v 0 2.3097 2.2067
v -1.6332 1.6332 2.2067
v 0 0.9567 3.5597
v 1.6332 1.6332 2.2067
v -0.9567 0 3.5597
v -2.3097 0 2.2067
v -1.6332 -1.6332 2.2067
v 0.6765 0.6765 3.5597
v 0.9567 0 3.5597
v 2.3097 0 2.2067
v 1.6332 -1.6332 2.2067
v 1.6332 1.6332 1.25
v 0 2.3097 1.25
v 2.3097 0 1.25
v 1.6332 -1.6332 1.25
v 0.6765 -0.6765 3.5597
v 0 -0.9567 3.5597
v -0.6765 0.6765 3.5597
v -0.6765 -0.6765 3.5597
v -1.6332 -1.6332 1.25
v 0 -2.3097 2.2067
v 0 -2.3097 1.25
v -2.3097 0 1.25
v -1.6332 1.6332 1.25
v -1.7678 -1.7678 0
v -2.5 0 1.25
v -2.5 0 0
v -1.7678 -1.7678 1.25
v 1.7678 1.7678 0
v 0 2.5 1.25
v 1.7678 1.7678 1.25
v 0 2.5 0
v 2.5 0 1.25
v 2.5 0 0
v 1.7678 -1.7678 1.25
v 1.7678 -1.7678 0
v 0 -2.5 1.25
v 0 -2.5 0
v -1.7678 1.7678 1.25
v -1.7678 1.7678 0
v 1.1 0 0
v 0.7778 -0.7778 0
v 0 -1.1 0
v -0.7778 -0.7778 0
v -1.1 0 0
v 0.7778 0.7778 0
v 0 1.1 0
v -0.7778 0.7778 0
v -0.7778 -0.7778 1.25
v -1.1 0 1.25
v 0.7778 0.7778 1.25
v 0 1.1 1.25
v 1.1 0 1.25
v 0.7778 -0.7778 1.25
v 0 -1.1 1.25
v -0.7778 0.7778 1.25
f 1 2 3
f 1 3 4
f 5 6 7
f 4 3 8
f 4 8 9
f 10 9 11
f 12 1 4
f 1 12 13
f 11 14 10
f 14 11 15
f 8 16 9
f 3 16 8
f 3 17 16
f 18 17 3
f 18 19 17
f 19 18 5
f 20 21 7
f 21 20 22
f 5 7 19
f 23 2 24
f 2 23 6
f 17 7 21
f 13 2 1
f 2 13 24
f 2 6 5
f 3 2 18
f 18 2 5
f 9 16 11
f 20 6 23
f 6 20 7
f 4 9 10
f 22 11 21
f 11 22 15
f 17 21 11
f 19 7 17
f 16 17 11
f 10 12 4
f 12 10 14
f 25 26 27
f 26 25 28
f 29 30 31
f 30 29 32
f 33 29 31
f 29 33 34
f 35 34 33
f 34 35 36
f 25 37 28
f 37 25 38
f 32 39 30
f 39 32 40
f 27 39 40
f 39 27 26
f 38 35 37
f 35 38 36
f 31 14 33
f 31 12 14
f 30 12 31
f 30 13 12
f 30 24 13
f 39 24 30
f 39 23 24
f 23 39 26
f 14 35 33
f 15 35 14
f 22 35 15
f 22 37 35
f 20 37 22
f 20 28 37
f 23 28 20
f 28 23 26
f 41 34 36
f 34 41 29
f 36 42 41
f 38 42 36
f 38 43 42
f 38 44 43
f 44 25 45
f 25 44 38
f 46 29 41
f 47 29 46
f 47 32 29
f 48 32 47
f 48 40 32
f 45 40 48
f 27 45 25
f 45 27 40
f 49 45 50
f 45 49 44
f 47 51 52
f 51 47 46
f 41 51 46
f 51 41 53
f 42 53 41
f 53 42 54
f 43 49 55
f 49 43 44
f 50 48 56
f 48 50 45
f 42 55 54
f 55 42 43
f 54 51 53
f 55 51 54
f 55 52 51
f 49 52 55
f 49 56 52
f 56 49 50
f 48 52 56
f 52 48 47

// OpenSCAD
// file: axle.scad
include <config.scad>;

arm_height = 2 * AXLE_RADIUS;
axle_height = ROOF_HEIGHT + BASE_TOTAL_HEIGHT - EASE;

module carousel_axle_arms() {
    arm_length = 8 * AXLE_RADIUS;
    arm_width = AXLE_RADIUS;

    color(COLOR_AXLE) {
        difference() {
            union() {
                cylinder(h = arm_height, r = 2 * AXLE_RADIUS);
                for (i = [0 : CAROUSEL_FACE_COUNT/2]){
                    rotate(2 * i * 360/CAROUSEL_FACE_COUNT, [0, 0, 1])
                    translate([0, -arm_width/2, 0])
                    cube([arm_length, arm_width, arm_height]);
                }
            }
            translate([0, 0, -BLEED/2])
                cylinder(h = arm_height + BLEED, r = AXLE_RADIUS + EASE);
        }
    }
}

module carousel_axle() {
    color(COLOR_AXLE) {
        cylinder(h = axle_height, r = AXLE_RADIUS);
        translate([0, 0, axle_height - 3 * arm_height])
            cylinder(h = 2 * AXLE_RADIUS, r1 = AXLE_RADIUS, r2 = 2 * AXLE_RADIUS);
    }
}

// just for presentation, for 3D print the separate parts are better...
module carousel_axle_all_in_one() {
    carousel_axle();
    translate([0, 0, axle_height - 2 * arm_height])
    carousel_axle_arms();
}

PEG_SIZE = [0.5 * AXLE_RADIUS, 0.5 * AXLE_RADIUS, 1.5 * AXLE_RADIUS];

module carousel_axle_half() {
    peg_heights = [0.05, 0.35, 0.65, 0.95];

    translate([-axle_height/2, 0, 0])
    rotate([0, 90, 0])
    difference() {
        carousel_axle();
        translate([0, -5 * AXLE_RADIUS, -BLEED/2])
            cube([10 * AXLE_RADIUS, 10 * AXLE_RADIUS, axle_height + BLEED]);
        for (fz = peg_heights) {
            translate([-PEG_SIZE.x, -PEG_SIZE.y/2, fz * axle_height])
                cube([PEG_SIZE.x + EASE, PEG_SIZE.y + EASE, PEG_SIZE.z + EASE]);
        }
    }
}

module carousel_axle_peg() {
    //translate([0, 0, PEG_SIZE.x/2])
    x = PEG_SIZE.z;
    y = PEG_SIZE.y * 2;
    z = PEG_SIZE.x;

    color(COLOR_AXLE)
    cube([x, y, z], center = true);
}

module carousel_axle_bom() {
    dy = 3 * AXLE_RADIUS;

    translate([0, dy, 0])
    carousel_axle_half();

    translate([0, -dy, 0])
    rotate([0, 0, 180])
        carousel_axle_half();

    for (i = [0:3]) {
        translate([2 * i * PEG_SIZE.z, 0, PEG_SIZE.x/2])
        carousel_axle_peg();
    }
}

carousel_axle_bom();
// file: nut.scad
include <config.scad>;

function diam_to_flats(d) = (0.5 * d * sqrt(3));
function flats_to_diam(s) = (2 * s / sqrt(3));

module nut(diam, m, center = false) {
    translate([0, 0, center ? -m/2 : 0])
    rotate(30)
    cylinder(d = diam, h = m, $fn = 6);
}

module nut_ring(diam_outer, diam_inner, m, center = false) {
    translate([0, 0, center ? -m/2 : 0])
    difference() {
        nut(diam_outer, m, center = false);
        translate([0, 0, -BLEED/2])
        nut(diam_inner, m + BLEED, center = false);
    }
}
// file: bearing.scad
include <config.scad>;
use <commons.scad>;

module _bearing_socket(bearing_height, shell_height) {
    difference() {
        // socket body
        cylinder(h = shell_height + bearing_height, d = BEARING_DIAM_OUTER + EASE + 2 * BEARING_SHELL_THICKNESS);
        // bearing slot
        translate([0, 0, shell_height - BLEED])
        cylinder(h = bearing_height + shell_height + EASE, d = BEARING_DIAM_OUTER + EASE);
    }
}

module bearing_top_hole() {
    cylinder(h = BEARING_HEIGHT_TOP + EASE, d = BEARING_DIAM_OUTER + EASE);
    translate([0, 0, BEARING_HEIGHT_TOP - BLEED])
    cylinder(h = BEARING_PEG_OVERRUN + BLEED + 2 * EASE, d = BEARING_DIAM_INNER + 2 * EASE);
}

module bearing_bottom() {
    _bearing_socket(BEARING_HEIGHT_BOTTOM, BEARING_SHELL_BOTTOM);
    translate([0, 0, BEARING_SHELL_BOTTOM - BLEED])
    cylinder(h = BEARING_HEIGHT_BOTTOM + BEARING_HEIGHT_TOP + BEARING_PEG_OVERRUN + BLEED, d = BEARING_DIAM_INNER - EASE);
}

module bearing_top() {
    total_height = BEARING_HEIGHT_TOP + BEARING_SHELL_TOP;
    translate([0, 0, total_height])
    rotate([180, 0, 0])
    difference() {
        cylinder(h = total_height, d = BEARING_DIAM_OUTER + 2 * BEARING_SHELL_THICKNESS + EASE);
        translate([0, 0, -BLEED])
        bearing_top_hole();
    }
}

function mounted_bearing_height() = BEARING_HEIGHT_BOTTOM + BEARING_HEIGHT_TOP + BEARING_SHELL_THICKNESS + BEARING_SHELL_BOTTOM;

// module printable_bearing_bom() {
//     color(COLOR_AXLE) {
//         dx = BEARING_DIAM_OUTER/2 + BEARING_SHELL_THICKNESS + 10*EASE;
//         translate([-dx, 0, 0]) bearing_bottom();
//         translate([+dx, 0, 0]) bearing_top();
//     }
// }

// printable_bearing_bom();
// file: commons.scad
module rect_prism(width, height, p0, p1) {
    dir = p1 - p0;
    h = norm(dir);
    if (dir[0] == 0 && dir[1] == 0) {
        // no transformation necessary
        translate(p0)
        translate([0, 0, h/2])
        cube([size, size, h], center = true);
    }
    else {
        w  = dir / h;
        u0 = cross(w, [0,0,1]);
        u  = u0 / norm(u0);
        v0 = cross(w, u);
        v  = v0 / norm(v0);
        multmatrix(m=[[u[0], v[0], w[0], p0.x],
                      [u[1], v[1], w[1], p0.y],
                      [u[2], v[2], w[2], p0.z],
                      [0,    0,    0,    1]])
        translate([0, 0, h/2])
        cube([width, height, h], center = true);
    }
}

module square_prism(size, p0, p1) {
    rect_prism(size, size, p0, p1);
}

module point_plate(thickness, point_array, indices, fn = 8) {
    hull() {
        for (i = indices) {
            translate(point_array[i])
            sphere(d = thickness, $fn = fn);
        }
    }
}
// file: rig.scad
include <config.scad>;
use <commons.scad>;

use <bearing.scad>;
use <nut.scad>;
use <axle.scad>;
use <lance.scad>;

RIG_CAP_BLEED_HEIGHT = 2;
RIG_CAP_BLEED_DIAM = BEARING_DIAM_INNER;

ROTATOR_FN = 6;

module rig_ribs() {
    inner_sin = sin(360/CAROUSEL_FACE_COUNT/2);
    // iterate each face/wall spot
    dz = 0.5 * RIG_STR;
    for (i = [0 : CAROUSEL_FACE_COUNT]) {
        rotate(i * 360/CAROUSEL_FACE_COUNT, [0, 0, 1]) {
            // star-beam
            square_prism(RIG_STR, [BEARING_DIAM_OUTER/2, 0, dz], [RIG_MAX_R, 0, dz]);
            // cross-beams
            for (frac = RIG_RING_POSITIONS) {
                ring_r = frac * RIG_MAX_R;
                translate([ring_r, 0, 0])
                rotate([0, 0, 180 - FACE_ANGLE/2])
                difference() {
                    dx = 2 * ring_r * inner_sin;
                    square_prism(RIG_STR, [0, 0, dz], [dx, 0, dz]);
                    translate([dx/2, 0, -BLEED])
                    mounted_lance(with_ease = true);
                }
            }
        }
    }
}

function lance_dx_offset(frac) = frac * RIG_MAX_R - BEAM_SIZE/4;

module rig_shape() {
    color(COLOR_AXLE) {
        // cut out nest for top arm rotator
        difference() {
            bearing_top();
            translate([0, 0, -BLEED])
            cylinder(h = RIG_CAP_BLEED_HEIGHT + BLEED, d = RIG_CAP_BLEED_DIAM + EASE, $fn = ROTATOR_FN);
        }
        // outer ring
        difference() {
            cylinder(h = RIG_HEIGHT, r = RIG_MAX_R);
            translate([0, 0, -0.5 * BLEED])
            cylinder(h = RIG_HEIGHT + BLEED, r = RIG_MAX_R - RIG_STR);
        }
        // ribs with lance holes
        difference() {
            rig_ribs();
            for (i = [0 : CAROUSEL_FACE_COUNT]) {
                rotate(i * 360/CAROUSEL_FACE_COUNT, [0, 0, 1]) {
                    // #square_prism(RIG_STR, [BEARING_DIAM_OUTER/2, 0, dz], [RIG_MAX_R, 0, dz]);
                    for (frac = RIG_RING_POSITIONS) {
                        ring_r = lance_dx_offset(frac);
                        translate([ring_r, 0, -BLEED])
                        mounted_lance(with_ease = true);
                    }
                }
            }
        }
    }
}

// Top rotating part used to attach the carousel seats.
module printable_rig() {
    nut_floor = 1;
    dx = RIG_MAX_R - RIG_STR/2;
    color(COLOR_AXLE) {
        difference() {
            // core round shape
            rig_shape();
            // cut off space for nut holders
            for (i = [0 : CAROUSEL_FACE_COUNT]) {
                rotate(i * 360/CAROUSEL_FACE_COUNT, [0, 0, 1])
                translate([dx, 0, -BLEED/2])
                nut(RIG_NUT_SIZE + RIG_NUT_WALL, RIG_HEIGHT + BLEED);
            }
        }
        // add nut holders
        for (i = [0 : CAROUSEL_FACE_COUNT]) {
            rotate(i * 360/CAROUSEL_FACE_COUNT, [0, 0, 1]) {
                translate([dx, 0, 0])
                nut_ring(RIG_NUT_SIZE + RIG_NUT_WALL + BLEED, RIG_NUT_SIZE - EASE, RIG_STR);

                translate([dx, 0, RIG_STR - nut_floor])
                nut(RIG_NUT_SIZE + RIG_NUT_WALL/2, nut_floor);
            }
        }
    }
}

function mounted_rig_height() = axle_ground_height_pegless() + bearing_height_total();

module mounted_rig() {
    dz = mounted_rig_height();
    translate([0, 0, dz])
    rotate([180, 0, 0])
    printable_rig();
}

module printable_arm_head(diam = RIG_STR, cap_width_multiplier = 2) {
    arm_height = RIG_STR;
    arm_length = 6 * AXLE_RADIUS;
    arm_width = AXLE_RADIUS;

    color(COLOR_BASE) {
        difference() {
            union() {
                cnt = 4;
                cylinder(h = arm_height, d = cap_width_multiplier * diam);
                for (i = [0 : cnt]){
                    rotate(i * 360/cnt, [0, 0, 1])
                    translate([0, -arm_width/2, 0])
                    cube([arm_length, arm_width, arm_height]);
                }
            }
            translate([0, 0, -BLEED/2])
            cylinder(h = arm_height + BLEED, d = diam + 2*EASE, $fn = ROTATOR_FN);
        }
    }
}

cap_diam = 1 * AXLE_RADIUS;
cap_height =  1.5 * ROOF_HEIGHT;

module printable_arm_cap_peg() {
    xx = 2 * cap_diam;
    yy = cap_diam/2 - EASE;

    color(COLOR_AXLE)
    translate([-xx/2, -yy/2, EASE/2])
    cube([xx, yy, cap_diam/4 - EASE]);
}

module arm_cap(cap_width_multiplier = 2) {
    color(COLOR_AXLE)
    difference() {
        union() {
            // base straight
            translate([0, 0, -RIG_CAP_BLEED_HEIGHT])
            cylinder(h = RIG_CAP_BLEED_HEIGHT + BLEED, d = RIG_CAP_BLEED_DIAM, $fn = ROTATOR_FN);
            // base chamfered
            cylinder(h = 2 * RIG_CAP_BLEED_HEIGHT, d1 = RIG_CAP_BLEED_DIAM, d2 = cap_diam - BLEED, $fn = ROTATOR_FN);
            // cap axle
            cylinder(h = cap_height, d = cap_diam, $fn = ROTATOR_FN);
            // arms guard
            translate([0, 0, ROOF_HEIGHT])
            cylinder(h = RIG_STR, d1 = cap_diam, d2 = cap_width_multiplier * RIG_STR, $fn = ROTATOR_FN);
        }
        translate([-BLEED/2, 0, ROOF_HEIGHT + RIG_STR + RIG_STR + cap_diam/8 + 2*EASE])
        cube([cap_diam + BLEED, cap_diam/2, cap_diam/4], center = true);
    }
}

module mounted_rotator() {
    translate([0, 0, mounted_rig_height() + EASE]) {
        arm_cap();
        translate([0, 0, ROOF_HEIGHT + RIG_STR + EASE])
        printable_arm_head();
        translate([0, 0, ROOF_HEIGHT + RIG_STR + RIG_STR + 2*EASE])
        printable_arm_cap_peg();
    }
}

// mounted_rig();
// mounted_rotator();
printable_rig();
// printable_arm_head();
// printable_arm_cap_peg();

// TODO - add caps to keep nuts covered?
// file: config.scad
// ----------------------------------------------------------------------------
// Configuration of the carousel and its components.
//
// All the values beyod "---- derived" string in each of the sections should
// not be modified manually, as they are derived from the previously defined
// parameters in some way...
// ----------------------------------------------------------------------------

// Generic parameters to address consistency & interconnections of parts.
CYL_FN = 32; // BEWARE!!! set to +- 256 for STL export!
BLEED = 0.5; // overlap for union & difference operations
EASE = 0.2; // socket/pin ease for interconnecting of parts & holes

// Core defining shape of our carousel is N-faced cylinder.
// This affects most of the subsequent parameter definitions & usage.
CAROUSEL_FACE_COUNT = 6;
CAROUSEL_ESCRIBED_RADIUS = 120;
// ---- derived
CAROUSEL_INSCRIBED_RADIUS = CAROUSEL_ESCRIBED_RADIUS * cos(180/CAROUSEL_FACE_COUNT);

// Base of the carousel -> stand that holds the axle, walls, etc.
BASE_TOTAL_HEIGHT = 24;
BASE_FLOOR_THICKNESS = 4;
BASE_WALL_THICKNESS = 4;

// Face, or, a wall of the carousel "shell".
FACE_HEIGHT = 150;
FACE_HEIGHT_ROOF_START_RATIO = 0.85;    // percentage of full wall height to be skewed

FACE_THICKNESS = 5;
// size of wall struts/doorframe
BEAM_SIZE = 1.1 * FACE_THICKNESS;

// ---- derived
FACE_WIDTH = CAROUSEL_ESCRIBED_RADIUS * 2 * sin(180/CAROUSEL_FACE_COUNT);
FACE_ANGLE = (1 - 2/CAROUSEL_FACE_COUNT)*180;
FACE_APOTHEM_LEN = FACE_WIDTH / (2 * tan(180/CAROUSEL_FACE_COUNT));
FACE_DOOR_HEIGHT = 0.66 * FACE_HEIGHT;
FACE_DOOR_WIDTH = 0.75 * FACE_WIDTH;

// Roof of the carousel.
ROOF_THICKNESS = 1;
ROOF_HEIGHT = 50;

// Ball bearing - real-life dimensions of ball bearing used to "power" the axle.
BEARING_DIAM_OUTER = 32;
BEARING_DIAM_INNER = 15;
BEARING_HEIGHT_BOTTOM = 8;
BEARING_HEIGHT_TOP = 5;
BEARING_SHELL_THICKNESS = 1;
BEARING_SHELL_BOTTOM = 3;
BEARING_SHELL_TOP = 7;

BEARING_PEG_OVERRUN = BEARING_HEIGHT_TOP;

// Axle rotating inside carousel.
AXLE_RADIUS = FACE_THICKNESS;

// Rotating rig carrying the seats.
RIG_HEIGHT = 6;
RIG_STR = 6;

RIG_NUT_SIZE = 10;  // 4 for M4 nut, 10 for M10 nut, etc.
RIG_NUT_WALL = 3;   // thickness of the wall around hole to carry nut

// Abstract "rings" carrying seats, and their distance off the carousel center
// as a fraction of radius.
RIG_RING_POSITIONS = [0.4, 0.8];
RIG_MAX_R = 0.90 * CAROUSEL_INSCRIBED_RADIUS;

COLOR_WALL = "BurlyWood";
COLOR_STRUTS = "SaddleBrown";
COLOR_BASE = "DarkGray";
COLOR_ROOF = "DarkSeaGreen";
COLOR_AXLE = "SaddleBrown";
// main file
include <config.scad>;

use <rig.scad>;

LANCE_DIAM = 2;
LANCE_FN = 8;

COLOR_LANCE = COLOR_BASE;

module _half_sphere_top(d, with_bottom_bleed = true) {
    difference() {
        sphere(d = d);
        z_fix = with_bottom_bleed ? BLEED : 0;
        translate([0, 0, -(d/2 + BLEED)/2 - z_fix])
        cube([d + BLEED, d + BLEED, d/2 + BLEED], center = true);
    }
}

module printable_mounting_lance_cap() {
    cap_diam = 2.5 * LANCE_DIAM;
    cap_straight_height = cap_diam/4;
    color(COLOR_LANCE)
    difference() {
        union() {
            translate([0, 0, cap_straight_height]) _half_sphere_top(cap_diam);
            cylinder(h = cap_straight_height, d = cap_diam);
        }
        // hole for lance
        translate([0, 0, -BLEED])
        cylinder(d = LANCE_DIAM + EASE, h = cap_straight_height + BLEED, $fn = LANCE_FN);
    }
}

module mounted_lance(with_ease = false) {
    height = mounted_rig_height();
    extra_ease = with_ease ? EASE : 0;

    color(COLOR_LANCE)
    cylinder(d = LANCE_DIAM + extra_ease, h = height, $fn = LANCE_FN);
}

module printable_lance() {
    rotate([0, 90, 0])
    translate([-LANCE_DIAM/2, 0, 0])
    rotate([0, 0, 180/LANCE_FN])
    mounted_lance();
}

module mounting_lance_carve() {
    difference() {
        children();
        mounted_lance();
    }
}

// printable_lance();
printable_mounting_lance_cap();
